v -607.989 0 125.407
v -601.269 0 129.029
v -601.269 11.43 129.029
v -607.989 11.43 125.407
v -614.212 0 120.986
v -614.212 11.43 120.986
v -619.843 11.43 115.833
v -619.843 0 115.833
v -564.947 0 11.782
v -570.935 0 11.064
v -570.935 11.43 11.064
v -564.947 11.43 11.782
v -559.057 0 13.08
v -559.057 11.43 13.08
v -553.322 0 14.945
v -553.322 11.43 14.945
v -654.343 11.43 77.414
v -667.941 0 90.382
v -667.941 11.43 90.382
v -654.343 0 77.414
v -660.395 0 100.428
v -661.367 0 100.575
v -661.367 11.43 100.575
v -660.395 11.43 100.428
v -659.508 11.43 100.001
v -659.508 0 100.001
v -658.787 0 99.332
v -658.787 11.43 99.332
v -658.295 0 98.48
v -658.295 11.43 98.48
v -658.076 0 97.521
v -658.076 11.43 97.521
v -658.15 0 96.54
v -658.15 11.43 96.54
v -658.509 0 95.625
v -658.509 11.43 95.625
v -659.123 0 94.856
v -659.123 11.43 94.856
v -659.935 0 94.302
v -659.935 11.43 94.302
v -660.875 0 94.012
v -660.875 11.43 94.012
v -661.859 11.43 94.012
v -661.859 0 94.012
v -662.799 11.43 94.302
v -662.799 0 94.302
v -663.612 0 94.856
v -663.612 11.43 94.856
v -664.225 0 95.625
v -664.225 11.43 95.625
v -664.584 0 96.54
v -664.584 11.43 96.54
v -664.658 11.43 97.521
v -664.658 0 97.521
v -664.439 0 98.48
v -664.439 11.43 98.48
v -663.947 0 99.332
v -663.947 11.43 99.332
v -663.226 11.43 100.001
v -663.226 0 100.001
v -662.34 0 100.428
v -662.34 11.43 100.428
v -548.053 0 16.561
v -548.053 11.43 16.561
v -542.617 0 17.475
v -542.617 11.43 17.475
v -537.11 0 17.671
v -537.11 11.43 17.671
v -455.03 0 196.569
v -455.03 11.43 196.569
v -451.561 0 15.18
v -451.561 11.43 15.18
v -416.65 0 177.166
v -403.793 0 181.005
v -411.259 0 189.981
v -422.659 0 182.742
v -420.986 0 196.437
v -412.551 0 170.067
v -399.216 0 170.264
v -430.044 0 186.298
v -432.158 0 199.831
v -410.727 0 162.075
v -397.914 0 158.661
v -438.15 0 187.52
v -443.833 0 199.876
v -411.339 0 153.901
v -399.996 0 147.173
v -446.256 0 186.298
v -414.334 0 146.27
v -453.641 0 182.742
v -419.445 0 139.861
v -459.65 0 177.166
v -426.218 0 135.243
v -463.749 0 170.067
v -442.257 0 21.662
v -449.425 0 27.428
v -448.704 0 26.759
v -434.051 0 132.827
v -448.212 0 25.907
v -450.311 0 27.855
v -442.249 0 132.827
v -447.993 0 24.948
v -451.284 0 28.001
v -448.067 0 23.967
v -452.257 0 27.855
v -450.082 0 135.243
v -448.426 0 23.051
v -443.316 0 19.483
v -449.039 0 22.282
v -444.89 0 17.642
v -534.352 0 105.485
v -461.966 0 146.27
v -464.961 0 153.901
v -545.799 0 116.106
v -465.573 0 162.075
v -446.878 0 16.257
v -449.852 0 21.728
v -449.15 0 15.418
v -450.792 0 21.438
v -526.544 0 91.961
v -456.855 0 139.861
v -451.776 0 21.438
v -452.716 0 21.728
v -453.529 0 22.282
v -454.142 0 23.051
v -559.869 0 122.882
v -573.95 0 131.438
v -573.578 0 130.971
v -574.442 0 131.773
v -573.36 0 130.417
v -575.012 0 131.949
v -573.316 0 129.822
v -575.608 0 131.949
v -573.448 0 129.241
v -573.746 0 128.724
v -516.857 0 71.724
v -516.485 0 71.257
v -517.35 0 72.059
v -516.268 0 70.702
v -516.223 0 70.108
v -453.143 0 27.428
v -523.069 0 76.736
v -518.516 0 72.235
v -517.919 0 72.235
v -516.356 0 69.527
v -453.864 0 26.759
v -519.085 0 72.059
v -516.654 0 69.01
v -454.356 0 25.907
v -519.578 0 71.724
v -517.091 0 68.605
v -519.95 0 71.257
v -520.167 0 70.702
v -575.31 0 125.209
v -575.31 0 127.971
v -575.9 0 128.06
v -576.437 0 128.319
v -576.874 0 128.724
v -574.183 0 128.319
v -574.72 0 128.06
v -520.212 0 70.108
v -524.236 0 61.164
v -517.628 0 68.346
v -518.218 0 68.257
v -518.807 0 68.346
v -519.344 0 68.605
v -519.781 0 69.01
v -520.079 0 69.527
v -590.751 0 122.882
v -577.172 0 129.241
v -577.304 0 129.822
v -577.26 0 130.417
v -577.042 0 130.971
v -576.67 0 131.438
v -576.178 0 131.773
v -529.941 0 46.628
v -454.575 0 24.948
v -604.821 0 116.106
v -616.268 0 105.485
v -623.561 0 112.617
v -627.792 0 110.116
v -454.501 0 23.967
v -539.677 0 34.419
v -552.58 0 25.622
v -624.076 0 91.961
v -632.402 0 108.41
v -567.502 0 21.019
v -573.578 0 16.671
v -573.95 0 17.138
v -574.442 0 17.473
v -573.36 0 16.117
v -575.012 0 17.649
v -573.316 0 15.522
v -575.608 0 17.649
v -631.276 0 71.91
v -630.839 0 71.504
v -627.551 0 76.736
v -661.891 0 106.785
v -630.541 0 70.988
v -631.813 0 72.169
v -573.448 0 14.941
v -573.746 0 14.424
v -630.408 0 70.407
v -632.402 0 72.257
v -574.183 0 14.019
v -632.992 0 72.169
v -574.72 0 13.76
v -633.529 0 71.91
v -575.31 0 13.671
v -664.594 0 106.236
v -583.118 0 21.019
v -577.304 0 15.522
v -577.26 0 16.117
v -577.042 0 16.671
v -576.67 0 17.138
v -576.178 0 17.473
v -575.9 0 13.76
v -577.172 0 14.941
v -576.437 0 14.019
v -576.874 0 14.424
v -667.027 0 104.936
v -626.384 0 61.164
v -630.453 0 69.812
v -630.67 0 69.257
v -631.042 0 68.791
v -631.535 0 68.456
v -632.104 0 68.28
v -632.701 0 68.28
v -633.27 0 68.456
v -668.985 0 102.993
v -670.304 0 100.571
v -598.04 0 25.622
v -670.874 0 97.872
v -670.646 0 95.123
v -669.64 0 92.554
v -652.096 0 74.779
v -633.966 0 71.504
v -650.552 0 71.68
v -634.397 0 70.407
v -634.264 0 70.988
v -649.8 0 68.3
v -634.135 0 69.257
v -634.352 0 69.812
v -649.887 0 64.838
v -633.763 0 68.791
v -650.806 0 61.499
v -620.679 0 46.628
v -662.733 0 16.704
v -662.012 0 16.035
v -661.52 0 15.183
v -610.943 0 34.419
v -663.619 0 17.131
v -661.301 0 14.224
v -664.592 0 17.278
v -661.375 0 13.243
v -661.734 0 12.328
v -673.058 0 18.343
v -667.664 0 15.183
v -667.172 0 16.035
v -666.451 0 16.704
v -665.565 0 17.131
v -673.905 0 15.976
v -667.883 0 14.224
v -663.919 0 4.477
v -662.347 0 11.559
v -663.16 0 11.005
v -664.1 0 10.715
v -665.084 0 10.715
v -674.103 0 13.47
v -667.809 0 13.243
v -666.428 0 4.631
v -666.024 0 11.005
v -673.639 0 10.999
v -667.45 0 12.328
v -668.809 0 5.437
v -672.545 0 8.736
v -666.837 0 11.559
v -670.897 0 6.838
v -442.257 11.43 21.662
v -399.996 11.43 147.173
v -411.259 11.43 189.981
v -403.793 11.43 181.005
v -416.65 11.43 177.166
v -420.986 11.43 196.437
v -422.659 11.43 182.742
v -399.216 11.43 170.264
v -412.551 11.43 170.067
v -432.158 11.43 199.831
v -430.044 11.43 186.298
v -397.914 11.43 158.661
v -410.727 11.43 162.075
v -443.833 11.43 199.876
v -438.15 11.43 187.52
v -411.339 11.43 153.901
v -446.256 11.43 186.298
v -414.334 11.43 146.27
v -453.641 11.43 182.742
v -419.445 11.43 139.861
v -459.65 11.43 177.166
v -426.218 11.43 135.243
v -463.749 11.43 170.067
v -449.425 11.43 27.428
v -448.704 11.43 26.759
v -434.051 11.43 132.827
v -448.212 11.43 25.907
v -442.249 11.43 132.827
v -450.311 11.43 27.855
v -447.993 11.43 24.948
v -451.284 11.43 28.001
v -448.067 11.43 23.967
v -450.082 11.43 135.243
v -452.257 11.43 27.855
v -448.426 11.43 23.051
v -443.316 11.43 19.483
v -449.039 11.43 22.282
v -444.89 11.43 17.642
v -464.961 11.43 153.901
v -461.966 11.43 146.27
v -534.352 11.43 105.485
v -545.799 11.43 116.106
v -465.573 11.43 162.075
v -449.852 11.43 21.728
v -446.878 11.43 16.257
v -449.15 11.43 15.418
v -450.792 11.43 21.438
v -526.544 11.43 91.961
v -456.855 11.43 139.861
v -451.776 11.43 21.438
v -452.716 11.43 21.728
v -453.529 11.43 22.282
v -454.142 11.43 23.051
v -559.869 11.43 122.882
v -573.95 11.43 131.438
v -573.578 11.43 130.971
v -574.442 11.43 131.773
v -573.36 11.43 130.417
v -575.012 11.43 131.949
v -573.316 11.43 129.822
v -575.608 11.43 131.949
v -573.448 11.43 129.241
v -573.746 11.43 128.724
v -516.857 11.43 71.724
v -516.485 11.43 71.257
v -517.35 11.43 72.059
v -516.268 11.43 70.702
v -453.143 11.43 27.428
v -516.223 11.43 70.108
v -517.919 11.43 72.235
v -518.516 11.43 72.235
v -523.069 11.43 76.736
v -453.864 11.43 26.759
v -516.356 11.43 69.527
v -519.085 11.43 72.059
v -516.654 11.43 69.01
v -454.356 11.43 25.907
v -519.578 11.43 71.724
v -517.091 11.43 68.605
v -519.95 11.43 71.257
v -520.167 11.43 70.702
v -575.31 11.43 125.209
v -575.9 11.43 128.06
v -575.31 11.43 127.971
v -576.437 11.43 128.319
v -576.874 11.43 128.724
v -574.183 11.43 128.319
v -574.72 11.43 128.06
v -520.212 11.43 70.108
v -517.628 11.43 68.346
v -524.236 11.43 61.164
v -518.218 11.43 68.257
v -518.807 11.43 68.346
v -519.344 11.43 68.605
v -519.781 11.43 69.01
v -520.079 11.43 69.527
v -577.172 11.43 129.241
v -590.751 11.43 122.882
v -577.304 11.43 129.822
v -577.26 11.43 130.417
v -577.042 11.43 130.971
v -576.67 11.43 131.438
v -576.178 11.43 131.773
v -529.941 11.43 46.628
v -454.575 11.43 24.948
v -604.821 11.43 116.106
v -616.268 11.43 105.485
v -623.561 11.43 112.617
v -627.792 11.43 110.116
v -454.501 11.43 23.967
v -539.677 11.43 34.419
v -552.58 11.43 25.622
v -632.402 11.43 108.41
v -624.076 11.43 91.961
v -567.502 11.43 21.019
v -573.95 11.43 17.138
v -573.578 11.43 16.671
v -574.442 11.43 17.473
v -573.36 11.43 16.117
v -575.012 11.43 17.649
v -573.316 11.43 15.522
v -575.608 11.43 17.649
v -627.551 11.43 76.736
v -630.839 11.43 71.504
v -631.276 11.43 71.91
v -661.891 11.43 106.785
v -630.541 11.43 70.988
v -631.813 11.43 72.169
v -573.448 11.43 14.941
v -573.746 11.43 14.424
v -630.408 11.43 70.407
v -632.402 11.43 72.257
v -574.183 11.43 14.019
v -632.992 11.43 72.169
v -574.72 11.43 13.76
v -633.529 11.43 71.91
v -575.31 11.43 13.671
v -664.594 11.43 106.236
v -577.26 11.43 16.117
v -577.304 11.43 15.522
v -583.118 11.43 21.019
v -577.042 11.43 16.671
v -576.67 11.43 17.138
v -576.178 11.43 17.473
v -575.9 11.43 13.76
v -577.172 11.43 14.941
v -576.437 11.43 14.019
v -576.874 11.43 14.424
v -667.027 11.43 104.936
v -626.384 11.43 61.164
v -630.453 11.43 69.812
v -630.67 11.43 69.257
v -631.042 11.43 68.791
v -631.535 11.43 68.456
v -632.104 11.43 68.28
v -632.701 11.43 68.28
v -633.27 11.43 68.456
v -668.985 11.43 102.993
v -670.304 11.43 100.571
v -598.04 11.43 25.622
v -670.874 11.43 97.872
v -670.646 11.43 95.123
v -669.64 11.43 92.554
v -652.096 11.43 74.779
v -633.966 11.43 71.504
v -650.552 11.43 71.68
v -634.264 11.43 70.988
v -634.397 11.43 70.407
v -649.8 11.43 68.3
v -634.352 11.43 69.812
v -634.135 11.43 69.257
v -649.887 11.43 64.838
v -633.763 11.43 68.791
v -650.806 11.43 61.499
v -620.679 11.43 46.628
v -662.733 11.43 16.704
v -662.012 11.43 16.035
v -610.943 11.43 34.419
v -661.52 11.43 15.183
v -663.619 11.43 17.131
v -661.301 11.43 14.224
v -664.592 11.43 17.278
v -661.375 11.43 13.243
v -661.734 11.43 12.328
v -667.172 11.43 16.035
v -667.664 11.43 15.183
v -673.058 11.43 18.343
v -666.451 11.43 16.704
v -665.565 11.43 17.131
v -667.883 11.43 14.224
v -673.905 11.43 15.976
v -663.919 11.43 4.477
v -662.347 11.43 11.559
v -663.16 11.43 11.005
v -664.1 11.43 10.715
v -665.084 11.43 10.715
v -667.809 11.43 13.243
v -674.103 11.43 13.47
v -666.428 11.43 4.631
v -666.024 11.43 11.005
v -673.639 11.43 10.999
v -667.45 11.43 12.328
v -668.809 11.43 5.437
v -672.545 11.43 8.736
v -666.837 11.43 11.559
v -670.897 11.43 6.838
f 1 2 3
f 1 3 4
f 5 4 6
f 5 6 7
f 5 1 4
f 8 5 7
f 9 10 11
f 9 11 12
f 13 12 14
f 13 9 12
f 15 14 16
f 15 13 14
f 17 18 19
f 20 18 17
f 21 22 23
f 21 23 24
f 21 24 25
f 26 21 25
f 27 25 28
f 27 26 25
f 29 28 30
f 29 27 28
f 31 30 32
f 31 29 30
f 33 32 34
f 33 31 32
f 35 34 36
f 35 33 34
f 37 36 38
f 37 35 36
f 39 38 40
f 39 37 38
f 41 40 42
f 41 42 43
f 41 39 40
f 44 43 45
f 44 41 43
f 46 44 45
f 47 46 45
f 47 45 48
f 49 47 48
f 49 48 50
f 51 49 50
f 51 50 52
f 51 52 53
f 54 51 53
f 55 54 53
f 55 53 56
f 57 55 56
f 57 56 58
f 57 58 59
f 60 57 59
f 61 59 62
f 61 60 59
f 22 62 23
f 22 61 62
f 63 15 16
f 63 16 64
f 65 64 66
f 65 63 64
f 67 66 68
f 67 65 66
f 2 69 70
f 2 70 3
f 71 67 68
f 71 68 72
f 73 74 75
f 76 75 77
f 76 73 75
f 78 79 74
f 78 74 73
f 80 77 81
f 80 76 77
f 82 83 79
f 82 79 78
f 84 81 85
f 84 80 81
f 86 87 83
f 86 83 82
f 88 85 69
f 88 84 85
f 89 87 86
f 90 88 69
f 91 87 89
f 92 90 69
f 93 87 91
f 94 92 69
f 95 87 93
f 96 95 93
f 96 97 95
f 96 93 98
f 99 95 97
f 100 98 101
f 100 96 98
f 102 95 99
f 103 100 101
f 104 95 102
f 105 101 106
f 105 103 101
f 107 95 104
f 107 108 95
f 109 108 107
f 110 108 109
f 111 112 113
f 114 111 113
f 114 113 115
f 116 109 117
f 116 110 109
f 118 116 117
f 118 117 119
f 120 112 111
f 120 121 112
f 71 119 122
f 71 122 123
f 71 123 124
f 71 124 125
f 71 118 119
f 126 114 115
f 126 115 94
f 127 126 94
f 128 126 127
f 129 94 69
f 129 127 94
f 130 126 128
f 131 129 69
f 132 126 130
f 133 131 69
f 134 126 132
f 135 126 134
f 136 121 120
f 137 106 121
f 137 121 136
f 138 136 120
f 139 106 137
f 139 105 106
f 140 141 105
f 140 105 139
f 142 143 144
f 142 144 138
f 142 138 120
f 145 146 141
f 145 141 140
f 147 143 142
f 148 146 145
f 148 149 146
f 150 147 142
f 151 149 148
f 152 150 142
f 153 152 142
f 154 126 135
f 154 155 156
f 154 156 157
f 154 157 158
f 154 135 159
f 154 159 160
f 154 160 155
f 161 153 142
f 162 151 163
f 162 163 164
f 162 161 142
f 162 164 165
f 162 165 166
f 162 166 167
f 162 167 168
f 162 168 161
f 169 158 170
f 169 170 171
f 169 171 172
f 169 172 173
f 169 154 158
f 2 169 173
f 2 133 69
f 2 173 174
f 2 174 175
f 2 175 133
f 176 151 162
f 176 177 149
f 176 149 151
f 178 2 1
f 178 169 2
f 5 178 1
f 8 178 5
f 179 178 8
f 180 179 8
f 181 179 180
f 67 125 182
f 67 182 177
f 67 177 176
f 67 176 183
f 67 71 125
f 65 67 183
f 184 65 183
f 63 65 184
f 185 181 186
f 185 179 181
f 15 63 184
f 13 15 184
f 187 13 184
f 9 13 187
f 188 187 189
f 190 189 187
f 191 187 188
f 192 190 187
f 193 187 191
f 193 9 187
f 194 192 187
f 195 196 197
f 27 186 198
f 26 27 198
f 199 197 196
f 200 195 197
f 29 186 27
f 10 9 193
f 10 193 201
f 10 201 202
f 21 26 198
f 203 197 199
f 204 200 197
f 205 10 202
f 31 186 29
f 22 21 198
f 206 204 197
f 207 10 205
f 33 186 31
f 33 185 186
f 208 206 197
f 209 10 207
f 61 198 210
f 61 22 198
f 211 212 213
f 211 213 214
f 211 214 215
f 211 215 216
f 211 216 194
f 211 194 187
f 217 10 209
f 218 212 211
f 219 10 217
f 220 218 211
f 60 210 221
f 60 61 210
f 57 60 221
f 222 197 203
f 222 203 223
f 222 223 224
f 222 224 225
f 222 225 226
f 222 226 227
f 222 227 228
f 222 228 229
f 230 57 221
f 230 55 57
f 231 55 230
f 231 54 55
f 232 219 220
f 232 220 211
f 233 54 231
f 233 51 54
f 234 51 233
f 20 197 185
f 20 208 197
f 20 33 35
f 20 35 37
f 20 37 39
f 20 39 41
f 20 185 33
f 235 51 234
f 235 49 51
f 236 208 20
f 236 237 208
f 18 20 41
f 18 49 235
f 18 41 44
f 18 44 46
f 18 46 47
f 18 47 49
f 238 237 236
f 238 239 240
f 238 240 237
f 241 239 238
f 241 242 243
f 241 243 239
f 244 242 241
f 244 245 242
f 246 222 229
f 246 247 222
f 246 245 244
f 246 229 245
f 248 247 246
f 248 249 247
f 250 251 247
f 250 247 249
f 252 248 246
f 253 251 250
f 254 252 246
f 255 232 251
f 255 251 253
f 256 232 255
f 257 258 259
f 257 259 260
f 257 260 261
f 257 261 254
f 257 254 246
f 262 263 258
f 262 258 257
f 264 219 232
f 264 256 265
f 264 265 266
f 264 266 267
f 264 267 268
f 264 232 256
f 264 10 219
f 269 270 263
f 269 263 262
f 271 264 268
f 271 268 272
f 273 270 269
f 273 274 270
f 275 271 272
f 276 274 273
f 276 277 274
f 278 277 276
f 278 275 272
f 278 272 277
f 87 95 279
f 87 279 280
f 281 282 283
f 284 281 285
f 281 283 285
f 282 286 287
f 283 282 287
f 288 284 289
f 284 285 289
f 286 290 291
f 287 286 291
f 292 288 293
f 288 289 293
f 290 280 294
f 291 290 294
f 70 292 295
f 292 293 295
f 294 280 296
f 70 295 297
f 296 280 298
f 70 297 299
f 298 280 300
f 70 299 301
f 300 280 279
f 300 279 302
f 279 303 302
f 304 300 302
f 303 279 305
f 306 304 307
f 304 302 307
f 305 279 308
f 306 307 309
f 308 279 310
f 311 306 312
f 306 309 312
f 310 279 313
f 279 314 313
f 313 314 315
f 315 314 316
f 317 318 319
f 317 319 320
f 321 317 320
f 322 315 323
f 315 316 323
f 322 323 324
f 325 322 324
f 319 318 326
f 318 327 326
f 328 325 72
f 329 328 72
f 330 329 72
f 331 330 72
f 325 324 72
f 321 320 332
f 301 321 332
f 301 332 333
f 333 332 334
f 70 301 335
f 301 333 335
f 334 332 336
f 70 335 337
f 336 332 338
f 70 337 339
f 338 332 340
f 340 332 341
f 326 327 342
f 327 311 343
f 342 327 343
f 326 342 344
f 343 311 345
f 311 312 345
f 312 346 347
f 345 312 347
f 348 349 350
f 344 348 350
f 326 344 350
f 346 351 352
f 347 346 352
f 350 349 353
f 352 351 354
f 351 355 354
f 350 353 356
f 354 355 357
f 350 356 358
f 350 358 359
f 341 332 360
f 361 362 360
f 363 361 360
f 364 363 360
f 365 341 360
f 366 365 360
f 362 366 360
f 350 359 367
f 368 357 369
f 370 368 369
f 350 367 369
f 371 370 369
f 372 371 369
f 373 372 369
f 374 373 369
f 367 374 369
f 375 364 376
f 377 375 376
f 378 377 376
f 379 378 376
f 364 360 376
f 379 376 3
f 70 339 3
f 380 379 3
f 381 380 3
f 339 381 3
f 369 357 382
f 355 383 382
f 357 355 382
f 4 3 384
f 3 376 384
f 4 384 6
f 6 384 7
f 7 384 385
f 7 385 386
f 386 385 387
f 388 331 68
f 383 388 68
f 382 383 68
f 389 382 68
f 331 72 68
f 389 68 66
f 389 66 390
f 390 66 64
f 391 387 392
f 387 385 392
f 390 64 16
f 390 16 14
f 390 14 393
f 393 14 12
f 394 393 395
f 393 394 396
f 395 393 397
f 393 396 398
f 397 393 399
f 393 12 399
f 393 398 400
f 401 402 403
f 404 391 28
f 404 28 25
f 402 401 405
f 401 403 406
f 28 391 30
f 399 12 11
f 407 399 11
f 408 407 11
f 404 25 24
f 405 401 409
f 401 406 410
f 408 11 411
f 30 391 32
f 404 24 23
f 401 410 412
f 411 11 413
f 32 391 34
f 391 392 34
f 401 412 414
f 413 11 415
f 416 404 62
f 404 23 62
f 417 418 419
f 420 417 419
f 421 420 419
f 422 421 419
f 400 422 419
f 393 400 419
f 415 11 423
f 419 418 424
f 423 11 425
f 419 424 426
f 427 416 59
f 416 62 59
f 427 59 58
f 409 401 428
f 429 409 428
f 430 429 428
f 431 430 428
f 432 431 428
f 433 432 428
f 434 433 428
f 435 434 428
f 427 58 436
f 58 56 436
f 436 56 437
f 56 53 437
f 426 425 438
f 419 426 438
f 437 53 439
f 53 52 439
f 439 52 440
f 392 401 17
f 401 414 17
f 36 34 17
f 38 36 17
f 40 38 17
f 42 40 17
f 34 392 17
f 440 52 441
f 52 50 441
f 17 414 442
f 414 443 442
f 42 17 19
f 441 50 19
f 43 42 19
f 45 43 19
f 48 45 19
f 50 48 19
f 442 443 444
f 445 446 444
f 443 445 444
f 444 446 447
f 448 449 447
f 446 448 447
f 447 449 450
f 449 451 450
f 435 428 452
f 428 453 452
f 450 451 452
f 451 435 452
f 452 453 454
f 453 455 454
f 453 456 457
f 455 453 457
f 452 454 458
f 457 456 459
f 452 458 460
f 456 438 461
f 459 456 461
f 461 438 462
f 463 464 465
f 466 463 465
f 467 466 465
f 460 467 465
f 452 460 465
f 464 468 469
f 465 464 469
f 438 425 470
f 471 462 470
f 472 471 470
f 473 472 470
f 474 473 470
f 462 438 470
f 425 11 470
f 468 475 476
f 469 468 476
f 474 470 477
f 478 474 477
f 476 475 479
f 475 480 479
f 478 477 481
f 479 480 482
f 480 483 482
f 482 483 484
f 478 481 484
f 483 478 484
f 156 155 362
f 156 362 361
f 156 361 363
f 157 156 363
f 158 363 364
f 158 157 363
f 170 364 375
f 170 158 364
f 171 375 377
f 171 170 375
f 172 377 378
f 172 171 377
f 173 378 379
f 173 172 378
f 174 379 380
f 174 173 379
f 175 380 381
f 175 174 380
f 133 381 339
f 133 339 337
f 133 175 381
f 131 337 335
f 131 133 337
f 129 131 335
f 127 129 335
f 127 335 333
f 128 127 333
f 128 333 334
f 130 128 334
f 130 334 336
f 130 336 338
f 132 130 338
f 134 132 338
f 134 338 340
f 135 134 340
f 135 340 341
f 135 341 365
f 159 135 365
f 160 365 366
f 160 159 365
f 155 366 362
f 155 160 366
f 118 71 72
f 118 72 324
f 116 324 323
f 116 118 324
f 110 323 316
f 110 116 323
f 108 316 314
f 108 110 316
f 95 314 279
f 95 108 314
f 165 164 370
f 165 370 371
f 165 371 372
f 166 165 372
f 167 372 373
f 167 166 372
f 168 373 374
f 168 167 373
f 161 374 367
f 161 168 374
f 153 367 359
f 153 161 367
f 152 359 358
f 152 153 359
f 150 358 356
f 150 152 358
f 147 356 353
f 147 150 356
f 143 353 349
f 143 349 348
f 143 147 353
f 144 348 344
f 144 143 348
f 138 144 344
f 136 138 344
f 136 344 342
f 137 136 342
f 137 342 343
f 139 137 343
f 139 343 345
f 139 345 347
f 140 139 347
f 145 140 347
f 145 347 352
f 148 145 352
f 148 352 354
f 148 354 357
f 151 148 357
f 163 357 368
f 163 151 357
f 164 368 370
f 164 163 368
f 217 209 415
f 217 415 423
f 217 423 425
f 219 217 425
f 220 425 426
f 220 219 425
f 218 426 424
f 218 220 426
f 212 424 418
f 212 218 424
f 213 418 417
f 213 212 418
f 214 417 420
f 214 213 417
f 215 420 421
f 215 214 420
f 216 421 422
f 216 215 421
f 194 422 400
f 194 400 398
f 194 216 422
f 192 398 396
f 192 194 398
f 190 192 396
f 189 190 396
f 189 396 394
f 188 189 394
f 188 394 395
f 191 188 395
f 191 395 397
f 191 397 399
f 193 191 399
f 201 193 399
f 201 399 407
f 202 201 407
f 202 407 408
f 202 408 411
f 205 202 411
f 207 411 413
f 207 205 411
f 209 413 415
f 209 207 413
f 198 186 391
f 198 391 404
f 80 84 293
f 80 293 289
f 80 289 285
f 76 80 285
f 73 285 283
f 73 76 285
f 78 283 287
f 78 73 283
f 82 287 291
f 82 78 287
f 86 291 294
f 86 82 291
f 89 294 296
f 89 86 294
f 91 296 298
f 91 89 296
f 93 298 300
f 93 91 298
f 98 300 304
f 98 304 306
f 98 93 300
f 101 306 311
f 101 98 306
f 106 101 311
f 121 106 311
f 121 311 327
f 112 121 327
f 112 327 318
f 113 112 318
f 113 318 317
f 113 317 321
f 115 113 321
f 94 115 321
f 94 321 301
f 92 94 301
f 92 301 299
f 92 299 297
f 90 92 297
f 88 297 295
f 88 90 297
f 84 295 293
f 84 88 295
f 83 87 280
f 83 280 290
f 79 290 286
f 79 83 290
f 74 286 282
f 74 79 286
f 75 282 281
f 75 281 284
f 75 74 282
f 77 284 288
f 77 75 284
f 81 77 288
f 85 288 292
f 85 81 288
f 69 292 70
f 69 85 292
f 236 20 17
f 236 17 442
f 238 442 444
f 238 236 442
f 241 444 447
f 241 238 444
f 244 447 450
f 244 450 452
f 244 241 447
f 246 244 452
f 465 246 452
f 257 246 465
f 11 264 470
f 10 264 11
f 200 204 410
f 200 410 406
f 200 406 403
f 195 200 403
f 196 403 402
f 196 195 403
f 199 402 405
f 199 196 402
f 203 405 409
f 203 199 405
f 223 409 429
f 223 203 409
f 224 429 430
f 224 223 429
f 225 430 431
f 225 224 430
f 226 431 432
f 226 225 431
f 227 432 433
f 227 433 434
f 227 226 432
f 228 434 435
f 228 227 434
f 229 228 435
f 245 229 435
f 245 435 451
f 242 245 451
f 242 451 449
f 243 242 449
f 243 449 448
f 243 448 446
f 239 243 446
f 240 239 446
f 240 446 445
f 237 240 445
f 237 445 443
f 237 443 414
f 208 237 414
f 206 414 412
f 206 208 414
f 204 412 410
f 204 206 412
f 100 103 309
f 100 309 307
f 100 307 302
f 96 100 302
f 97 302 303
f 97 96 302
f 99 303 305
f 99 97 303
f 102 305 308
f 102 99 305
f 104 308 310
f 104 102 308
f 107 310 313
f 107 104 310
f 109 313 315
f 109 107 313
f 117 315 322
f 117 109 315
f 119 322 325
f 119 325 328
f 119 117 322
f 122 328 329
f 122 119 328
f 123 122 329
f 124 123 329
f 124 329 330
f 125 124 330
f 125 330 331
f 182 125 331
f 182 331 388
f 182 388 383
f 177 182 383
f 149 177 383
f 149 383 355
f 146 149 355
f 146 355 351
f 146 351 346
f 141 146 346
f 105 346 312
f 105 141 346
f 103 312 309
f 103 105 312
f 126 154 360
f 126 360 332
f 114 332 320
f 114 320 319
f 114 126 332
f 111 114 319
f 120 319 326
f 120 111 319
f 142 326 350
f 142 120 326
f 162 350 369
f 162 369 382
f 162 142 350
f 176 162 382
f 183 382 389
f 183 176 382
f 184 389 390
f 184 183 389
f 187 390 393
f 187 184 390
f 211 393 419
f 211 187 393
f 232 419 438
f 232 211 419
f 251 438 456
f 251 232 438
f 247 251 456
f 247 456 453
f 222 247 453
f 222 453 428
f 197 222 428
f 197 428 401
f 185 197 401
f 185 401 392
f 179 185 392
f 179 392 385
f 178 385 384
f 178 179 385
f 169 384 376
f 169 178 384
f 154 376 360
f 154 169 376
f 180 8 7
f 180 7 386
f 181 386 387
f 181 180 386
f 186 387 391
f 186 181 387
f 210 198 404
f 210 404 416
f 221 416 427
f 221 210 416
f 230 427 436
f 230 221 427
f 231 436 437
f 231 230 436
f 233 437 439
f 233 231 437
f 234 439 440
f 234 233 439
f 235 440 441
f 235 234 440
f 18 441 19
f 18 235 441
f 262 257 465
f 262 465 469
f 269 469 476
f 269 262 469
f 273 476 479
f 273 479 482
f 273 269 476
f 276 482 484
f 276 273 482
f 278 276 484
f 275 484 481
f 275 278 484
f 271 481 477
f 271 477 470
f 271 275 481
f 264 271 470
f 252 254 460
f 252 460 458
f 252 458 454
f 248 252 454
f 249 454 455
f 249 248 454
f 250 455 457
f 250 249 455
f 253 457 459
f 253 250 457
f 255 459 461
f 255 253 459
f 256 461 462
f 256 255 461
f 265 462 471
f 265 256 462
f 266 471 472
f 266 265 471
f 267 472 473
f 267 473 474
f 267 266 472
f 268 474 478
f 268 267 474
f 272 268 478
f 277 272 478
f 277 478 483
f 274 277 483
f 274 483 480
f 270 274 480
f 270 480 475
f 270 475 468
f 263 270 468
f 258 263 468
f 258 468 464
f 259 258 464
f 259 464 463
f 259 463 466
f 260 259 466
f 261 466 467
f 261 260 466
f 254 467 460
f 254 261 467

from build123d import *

# Parameters (mm, degrees)
SKETCH1_R           = 3.3
SKETCH1_R_2         = 27.5
SKETCH1_R_3         = 52.3875
SKETCH1_R_4         = 2
BOSS_EXTRUDE1_DEPTH = 11.43


with BuildPart() as part:
    # Sketch1 → Boss-Extrude1 (new body)
    with BuildSketch(Plane(origin=(0, 0, 0), x_dir=(1, 0, 0), z_dir=(0, 1, 0))):
        with BuildLine():
            Line((-455.030211447, -196.569220819), (-601.269315712, -129.028875319))
            ThreePointArc((-601.269315712, -129.028875319), (-611.168375764, -123.292603215), (-619.842929594, -115.832822829))
            ThreePointArc((-619.842929594, -115.832822829), (-625.62049557, -111.271620388), (-632.402453753, -108.409823836))
            Line((-632.402453753, -108.409823836), (-661.891152149, -106.785342117))
            ThreePointArc((-661.891152149, -106.785342117), (-670.303863855, -100.570549133), (-667.940742704, -90.381681261))
            Line((-667.940742704, -90.381681261), (-654.343117313, -77.414452829))
            ThreePointArc((-654.343117313, -77.414452829), (-650.072978561, -70.012815509), (-650.805846426, -61.499224923))
            Line((-650.805846426, -61.499224923), (-673.057822329, -18.34288652))
            ThreePointArc((-673.057822329, -18.34288652), (-672.544957076, -8.73610108), (-663.918846707, -4.476573271))
            Line((-663.918846707, -4.476573271), (-570.934950003, -11.063752399))
            ThreePointArc((-570.934950003, -11.063752399), (-561.986230526, -12.359631359), (-553.321698813, -14.945124108))
            ThreePointArc((-553.321698813, -14.945124108), (-545.349986654, -17.107158275), (-537.109590399, -17.671477372))
            Line((-537.109590399, -17.671477372), (-451.561292182, -15.180486069))
            ThreePointArc((-451.561292182, -15.180486069), (-445.839616936, -16.885847624), (-442.257047488, -21.661936169))
            Line((-442.257047488, -21.661936169), (-399.995822112, -147.172985144))
            ThreePointArc((-399.995822112, -147.172985144), (-411.258692171, -189.980718354), (-455.030211447, -196.569220819))
        make_face()
        with Locations(Location((-661.367230642, -97.274762153, 0), (0, 0, 270))):
            Circle(SKETCH1_R, mode=Mode.SUBTRACT)
        with Locations(Location((-664.591931322, -13.977761728, 0), (0, 0, 270))):
            Circle(SKETCH1_R, mode=Mode.SUBTRACT)
        with Locations(Location((-451.284061184, -24.701450725, 0), (0, 0, 270))):
            Circle(SKETCH1_R, mode=Mode.SUBTRACT)
        with Locations(Location((-438.15, -160.02, 0), (0, 0, 270))):
            Circle(SKETCH1_R_2, mode=Mode.SUBTRACT)
        with Locations(Location((-575.31, -72.821477372, 0), (0, 0, 270))):
            Circle(SKETCH1_R_3, mode=Mode.SUBTRACT)
        with Locations(Location((-632.402453753, -70.257452317, 0), (0, 0, 270))):
            Circle(SKETCH1_R_4, mode=Mode.SUBTRACT)
        with BuildLine():
            ThreePointArc((-575.31, -17.671477372), (-573.31, -15.671477372), (-575.31, -13.671477372))
            ThreePointArc((-575.31, -13.671477372), (-577.31, -15.671477372), (-575.31, -17.671477372))
        make_face(mode=Mode.SUBTRACT)
        with BuildLine():
            ThreePointArc((-518.217546247, -72.257452317), (-516.217546247, -70.257452317), (-518.217546247, -68.257452317))
            ThreePointArc((-518.217546247, -68.257452317), (-520.217546247, -70.257452317), (-518.217546247, -72.257452317))
        make_face(mode=Mode.SUBTRACT)
        with BuildLine():
            ThreePointArc((-575.31, -131.971477372), (-573.31, -129.971477372), (-575.31, -127.971477372))
            ThreePointArc((-575.31, -127.971477372), (-577.31, -129.971477372), (-575.31, -131.971477372))
        make_face(mode=Mode.SUBTRACT)
    extrude(amount=BOSS_EXTRUDE1_DEPTH)


solid = part.part
